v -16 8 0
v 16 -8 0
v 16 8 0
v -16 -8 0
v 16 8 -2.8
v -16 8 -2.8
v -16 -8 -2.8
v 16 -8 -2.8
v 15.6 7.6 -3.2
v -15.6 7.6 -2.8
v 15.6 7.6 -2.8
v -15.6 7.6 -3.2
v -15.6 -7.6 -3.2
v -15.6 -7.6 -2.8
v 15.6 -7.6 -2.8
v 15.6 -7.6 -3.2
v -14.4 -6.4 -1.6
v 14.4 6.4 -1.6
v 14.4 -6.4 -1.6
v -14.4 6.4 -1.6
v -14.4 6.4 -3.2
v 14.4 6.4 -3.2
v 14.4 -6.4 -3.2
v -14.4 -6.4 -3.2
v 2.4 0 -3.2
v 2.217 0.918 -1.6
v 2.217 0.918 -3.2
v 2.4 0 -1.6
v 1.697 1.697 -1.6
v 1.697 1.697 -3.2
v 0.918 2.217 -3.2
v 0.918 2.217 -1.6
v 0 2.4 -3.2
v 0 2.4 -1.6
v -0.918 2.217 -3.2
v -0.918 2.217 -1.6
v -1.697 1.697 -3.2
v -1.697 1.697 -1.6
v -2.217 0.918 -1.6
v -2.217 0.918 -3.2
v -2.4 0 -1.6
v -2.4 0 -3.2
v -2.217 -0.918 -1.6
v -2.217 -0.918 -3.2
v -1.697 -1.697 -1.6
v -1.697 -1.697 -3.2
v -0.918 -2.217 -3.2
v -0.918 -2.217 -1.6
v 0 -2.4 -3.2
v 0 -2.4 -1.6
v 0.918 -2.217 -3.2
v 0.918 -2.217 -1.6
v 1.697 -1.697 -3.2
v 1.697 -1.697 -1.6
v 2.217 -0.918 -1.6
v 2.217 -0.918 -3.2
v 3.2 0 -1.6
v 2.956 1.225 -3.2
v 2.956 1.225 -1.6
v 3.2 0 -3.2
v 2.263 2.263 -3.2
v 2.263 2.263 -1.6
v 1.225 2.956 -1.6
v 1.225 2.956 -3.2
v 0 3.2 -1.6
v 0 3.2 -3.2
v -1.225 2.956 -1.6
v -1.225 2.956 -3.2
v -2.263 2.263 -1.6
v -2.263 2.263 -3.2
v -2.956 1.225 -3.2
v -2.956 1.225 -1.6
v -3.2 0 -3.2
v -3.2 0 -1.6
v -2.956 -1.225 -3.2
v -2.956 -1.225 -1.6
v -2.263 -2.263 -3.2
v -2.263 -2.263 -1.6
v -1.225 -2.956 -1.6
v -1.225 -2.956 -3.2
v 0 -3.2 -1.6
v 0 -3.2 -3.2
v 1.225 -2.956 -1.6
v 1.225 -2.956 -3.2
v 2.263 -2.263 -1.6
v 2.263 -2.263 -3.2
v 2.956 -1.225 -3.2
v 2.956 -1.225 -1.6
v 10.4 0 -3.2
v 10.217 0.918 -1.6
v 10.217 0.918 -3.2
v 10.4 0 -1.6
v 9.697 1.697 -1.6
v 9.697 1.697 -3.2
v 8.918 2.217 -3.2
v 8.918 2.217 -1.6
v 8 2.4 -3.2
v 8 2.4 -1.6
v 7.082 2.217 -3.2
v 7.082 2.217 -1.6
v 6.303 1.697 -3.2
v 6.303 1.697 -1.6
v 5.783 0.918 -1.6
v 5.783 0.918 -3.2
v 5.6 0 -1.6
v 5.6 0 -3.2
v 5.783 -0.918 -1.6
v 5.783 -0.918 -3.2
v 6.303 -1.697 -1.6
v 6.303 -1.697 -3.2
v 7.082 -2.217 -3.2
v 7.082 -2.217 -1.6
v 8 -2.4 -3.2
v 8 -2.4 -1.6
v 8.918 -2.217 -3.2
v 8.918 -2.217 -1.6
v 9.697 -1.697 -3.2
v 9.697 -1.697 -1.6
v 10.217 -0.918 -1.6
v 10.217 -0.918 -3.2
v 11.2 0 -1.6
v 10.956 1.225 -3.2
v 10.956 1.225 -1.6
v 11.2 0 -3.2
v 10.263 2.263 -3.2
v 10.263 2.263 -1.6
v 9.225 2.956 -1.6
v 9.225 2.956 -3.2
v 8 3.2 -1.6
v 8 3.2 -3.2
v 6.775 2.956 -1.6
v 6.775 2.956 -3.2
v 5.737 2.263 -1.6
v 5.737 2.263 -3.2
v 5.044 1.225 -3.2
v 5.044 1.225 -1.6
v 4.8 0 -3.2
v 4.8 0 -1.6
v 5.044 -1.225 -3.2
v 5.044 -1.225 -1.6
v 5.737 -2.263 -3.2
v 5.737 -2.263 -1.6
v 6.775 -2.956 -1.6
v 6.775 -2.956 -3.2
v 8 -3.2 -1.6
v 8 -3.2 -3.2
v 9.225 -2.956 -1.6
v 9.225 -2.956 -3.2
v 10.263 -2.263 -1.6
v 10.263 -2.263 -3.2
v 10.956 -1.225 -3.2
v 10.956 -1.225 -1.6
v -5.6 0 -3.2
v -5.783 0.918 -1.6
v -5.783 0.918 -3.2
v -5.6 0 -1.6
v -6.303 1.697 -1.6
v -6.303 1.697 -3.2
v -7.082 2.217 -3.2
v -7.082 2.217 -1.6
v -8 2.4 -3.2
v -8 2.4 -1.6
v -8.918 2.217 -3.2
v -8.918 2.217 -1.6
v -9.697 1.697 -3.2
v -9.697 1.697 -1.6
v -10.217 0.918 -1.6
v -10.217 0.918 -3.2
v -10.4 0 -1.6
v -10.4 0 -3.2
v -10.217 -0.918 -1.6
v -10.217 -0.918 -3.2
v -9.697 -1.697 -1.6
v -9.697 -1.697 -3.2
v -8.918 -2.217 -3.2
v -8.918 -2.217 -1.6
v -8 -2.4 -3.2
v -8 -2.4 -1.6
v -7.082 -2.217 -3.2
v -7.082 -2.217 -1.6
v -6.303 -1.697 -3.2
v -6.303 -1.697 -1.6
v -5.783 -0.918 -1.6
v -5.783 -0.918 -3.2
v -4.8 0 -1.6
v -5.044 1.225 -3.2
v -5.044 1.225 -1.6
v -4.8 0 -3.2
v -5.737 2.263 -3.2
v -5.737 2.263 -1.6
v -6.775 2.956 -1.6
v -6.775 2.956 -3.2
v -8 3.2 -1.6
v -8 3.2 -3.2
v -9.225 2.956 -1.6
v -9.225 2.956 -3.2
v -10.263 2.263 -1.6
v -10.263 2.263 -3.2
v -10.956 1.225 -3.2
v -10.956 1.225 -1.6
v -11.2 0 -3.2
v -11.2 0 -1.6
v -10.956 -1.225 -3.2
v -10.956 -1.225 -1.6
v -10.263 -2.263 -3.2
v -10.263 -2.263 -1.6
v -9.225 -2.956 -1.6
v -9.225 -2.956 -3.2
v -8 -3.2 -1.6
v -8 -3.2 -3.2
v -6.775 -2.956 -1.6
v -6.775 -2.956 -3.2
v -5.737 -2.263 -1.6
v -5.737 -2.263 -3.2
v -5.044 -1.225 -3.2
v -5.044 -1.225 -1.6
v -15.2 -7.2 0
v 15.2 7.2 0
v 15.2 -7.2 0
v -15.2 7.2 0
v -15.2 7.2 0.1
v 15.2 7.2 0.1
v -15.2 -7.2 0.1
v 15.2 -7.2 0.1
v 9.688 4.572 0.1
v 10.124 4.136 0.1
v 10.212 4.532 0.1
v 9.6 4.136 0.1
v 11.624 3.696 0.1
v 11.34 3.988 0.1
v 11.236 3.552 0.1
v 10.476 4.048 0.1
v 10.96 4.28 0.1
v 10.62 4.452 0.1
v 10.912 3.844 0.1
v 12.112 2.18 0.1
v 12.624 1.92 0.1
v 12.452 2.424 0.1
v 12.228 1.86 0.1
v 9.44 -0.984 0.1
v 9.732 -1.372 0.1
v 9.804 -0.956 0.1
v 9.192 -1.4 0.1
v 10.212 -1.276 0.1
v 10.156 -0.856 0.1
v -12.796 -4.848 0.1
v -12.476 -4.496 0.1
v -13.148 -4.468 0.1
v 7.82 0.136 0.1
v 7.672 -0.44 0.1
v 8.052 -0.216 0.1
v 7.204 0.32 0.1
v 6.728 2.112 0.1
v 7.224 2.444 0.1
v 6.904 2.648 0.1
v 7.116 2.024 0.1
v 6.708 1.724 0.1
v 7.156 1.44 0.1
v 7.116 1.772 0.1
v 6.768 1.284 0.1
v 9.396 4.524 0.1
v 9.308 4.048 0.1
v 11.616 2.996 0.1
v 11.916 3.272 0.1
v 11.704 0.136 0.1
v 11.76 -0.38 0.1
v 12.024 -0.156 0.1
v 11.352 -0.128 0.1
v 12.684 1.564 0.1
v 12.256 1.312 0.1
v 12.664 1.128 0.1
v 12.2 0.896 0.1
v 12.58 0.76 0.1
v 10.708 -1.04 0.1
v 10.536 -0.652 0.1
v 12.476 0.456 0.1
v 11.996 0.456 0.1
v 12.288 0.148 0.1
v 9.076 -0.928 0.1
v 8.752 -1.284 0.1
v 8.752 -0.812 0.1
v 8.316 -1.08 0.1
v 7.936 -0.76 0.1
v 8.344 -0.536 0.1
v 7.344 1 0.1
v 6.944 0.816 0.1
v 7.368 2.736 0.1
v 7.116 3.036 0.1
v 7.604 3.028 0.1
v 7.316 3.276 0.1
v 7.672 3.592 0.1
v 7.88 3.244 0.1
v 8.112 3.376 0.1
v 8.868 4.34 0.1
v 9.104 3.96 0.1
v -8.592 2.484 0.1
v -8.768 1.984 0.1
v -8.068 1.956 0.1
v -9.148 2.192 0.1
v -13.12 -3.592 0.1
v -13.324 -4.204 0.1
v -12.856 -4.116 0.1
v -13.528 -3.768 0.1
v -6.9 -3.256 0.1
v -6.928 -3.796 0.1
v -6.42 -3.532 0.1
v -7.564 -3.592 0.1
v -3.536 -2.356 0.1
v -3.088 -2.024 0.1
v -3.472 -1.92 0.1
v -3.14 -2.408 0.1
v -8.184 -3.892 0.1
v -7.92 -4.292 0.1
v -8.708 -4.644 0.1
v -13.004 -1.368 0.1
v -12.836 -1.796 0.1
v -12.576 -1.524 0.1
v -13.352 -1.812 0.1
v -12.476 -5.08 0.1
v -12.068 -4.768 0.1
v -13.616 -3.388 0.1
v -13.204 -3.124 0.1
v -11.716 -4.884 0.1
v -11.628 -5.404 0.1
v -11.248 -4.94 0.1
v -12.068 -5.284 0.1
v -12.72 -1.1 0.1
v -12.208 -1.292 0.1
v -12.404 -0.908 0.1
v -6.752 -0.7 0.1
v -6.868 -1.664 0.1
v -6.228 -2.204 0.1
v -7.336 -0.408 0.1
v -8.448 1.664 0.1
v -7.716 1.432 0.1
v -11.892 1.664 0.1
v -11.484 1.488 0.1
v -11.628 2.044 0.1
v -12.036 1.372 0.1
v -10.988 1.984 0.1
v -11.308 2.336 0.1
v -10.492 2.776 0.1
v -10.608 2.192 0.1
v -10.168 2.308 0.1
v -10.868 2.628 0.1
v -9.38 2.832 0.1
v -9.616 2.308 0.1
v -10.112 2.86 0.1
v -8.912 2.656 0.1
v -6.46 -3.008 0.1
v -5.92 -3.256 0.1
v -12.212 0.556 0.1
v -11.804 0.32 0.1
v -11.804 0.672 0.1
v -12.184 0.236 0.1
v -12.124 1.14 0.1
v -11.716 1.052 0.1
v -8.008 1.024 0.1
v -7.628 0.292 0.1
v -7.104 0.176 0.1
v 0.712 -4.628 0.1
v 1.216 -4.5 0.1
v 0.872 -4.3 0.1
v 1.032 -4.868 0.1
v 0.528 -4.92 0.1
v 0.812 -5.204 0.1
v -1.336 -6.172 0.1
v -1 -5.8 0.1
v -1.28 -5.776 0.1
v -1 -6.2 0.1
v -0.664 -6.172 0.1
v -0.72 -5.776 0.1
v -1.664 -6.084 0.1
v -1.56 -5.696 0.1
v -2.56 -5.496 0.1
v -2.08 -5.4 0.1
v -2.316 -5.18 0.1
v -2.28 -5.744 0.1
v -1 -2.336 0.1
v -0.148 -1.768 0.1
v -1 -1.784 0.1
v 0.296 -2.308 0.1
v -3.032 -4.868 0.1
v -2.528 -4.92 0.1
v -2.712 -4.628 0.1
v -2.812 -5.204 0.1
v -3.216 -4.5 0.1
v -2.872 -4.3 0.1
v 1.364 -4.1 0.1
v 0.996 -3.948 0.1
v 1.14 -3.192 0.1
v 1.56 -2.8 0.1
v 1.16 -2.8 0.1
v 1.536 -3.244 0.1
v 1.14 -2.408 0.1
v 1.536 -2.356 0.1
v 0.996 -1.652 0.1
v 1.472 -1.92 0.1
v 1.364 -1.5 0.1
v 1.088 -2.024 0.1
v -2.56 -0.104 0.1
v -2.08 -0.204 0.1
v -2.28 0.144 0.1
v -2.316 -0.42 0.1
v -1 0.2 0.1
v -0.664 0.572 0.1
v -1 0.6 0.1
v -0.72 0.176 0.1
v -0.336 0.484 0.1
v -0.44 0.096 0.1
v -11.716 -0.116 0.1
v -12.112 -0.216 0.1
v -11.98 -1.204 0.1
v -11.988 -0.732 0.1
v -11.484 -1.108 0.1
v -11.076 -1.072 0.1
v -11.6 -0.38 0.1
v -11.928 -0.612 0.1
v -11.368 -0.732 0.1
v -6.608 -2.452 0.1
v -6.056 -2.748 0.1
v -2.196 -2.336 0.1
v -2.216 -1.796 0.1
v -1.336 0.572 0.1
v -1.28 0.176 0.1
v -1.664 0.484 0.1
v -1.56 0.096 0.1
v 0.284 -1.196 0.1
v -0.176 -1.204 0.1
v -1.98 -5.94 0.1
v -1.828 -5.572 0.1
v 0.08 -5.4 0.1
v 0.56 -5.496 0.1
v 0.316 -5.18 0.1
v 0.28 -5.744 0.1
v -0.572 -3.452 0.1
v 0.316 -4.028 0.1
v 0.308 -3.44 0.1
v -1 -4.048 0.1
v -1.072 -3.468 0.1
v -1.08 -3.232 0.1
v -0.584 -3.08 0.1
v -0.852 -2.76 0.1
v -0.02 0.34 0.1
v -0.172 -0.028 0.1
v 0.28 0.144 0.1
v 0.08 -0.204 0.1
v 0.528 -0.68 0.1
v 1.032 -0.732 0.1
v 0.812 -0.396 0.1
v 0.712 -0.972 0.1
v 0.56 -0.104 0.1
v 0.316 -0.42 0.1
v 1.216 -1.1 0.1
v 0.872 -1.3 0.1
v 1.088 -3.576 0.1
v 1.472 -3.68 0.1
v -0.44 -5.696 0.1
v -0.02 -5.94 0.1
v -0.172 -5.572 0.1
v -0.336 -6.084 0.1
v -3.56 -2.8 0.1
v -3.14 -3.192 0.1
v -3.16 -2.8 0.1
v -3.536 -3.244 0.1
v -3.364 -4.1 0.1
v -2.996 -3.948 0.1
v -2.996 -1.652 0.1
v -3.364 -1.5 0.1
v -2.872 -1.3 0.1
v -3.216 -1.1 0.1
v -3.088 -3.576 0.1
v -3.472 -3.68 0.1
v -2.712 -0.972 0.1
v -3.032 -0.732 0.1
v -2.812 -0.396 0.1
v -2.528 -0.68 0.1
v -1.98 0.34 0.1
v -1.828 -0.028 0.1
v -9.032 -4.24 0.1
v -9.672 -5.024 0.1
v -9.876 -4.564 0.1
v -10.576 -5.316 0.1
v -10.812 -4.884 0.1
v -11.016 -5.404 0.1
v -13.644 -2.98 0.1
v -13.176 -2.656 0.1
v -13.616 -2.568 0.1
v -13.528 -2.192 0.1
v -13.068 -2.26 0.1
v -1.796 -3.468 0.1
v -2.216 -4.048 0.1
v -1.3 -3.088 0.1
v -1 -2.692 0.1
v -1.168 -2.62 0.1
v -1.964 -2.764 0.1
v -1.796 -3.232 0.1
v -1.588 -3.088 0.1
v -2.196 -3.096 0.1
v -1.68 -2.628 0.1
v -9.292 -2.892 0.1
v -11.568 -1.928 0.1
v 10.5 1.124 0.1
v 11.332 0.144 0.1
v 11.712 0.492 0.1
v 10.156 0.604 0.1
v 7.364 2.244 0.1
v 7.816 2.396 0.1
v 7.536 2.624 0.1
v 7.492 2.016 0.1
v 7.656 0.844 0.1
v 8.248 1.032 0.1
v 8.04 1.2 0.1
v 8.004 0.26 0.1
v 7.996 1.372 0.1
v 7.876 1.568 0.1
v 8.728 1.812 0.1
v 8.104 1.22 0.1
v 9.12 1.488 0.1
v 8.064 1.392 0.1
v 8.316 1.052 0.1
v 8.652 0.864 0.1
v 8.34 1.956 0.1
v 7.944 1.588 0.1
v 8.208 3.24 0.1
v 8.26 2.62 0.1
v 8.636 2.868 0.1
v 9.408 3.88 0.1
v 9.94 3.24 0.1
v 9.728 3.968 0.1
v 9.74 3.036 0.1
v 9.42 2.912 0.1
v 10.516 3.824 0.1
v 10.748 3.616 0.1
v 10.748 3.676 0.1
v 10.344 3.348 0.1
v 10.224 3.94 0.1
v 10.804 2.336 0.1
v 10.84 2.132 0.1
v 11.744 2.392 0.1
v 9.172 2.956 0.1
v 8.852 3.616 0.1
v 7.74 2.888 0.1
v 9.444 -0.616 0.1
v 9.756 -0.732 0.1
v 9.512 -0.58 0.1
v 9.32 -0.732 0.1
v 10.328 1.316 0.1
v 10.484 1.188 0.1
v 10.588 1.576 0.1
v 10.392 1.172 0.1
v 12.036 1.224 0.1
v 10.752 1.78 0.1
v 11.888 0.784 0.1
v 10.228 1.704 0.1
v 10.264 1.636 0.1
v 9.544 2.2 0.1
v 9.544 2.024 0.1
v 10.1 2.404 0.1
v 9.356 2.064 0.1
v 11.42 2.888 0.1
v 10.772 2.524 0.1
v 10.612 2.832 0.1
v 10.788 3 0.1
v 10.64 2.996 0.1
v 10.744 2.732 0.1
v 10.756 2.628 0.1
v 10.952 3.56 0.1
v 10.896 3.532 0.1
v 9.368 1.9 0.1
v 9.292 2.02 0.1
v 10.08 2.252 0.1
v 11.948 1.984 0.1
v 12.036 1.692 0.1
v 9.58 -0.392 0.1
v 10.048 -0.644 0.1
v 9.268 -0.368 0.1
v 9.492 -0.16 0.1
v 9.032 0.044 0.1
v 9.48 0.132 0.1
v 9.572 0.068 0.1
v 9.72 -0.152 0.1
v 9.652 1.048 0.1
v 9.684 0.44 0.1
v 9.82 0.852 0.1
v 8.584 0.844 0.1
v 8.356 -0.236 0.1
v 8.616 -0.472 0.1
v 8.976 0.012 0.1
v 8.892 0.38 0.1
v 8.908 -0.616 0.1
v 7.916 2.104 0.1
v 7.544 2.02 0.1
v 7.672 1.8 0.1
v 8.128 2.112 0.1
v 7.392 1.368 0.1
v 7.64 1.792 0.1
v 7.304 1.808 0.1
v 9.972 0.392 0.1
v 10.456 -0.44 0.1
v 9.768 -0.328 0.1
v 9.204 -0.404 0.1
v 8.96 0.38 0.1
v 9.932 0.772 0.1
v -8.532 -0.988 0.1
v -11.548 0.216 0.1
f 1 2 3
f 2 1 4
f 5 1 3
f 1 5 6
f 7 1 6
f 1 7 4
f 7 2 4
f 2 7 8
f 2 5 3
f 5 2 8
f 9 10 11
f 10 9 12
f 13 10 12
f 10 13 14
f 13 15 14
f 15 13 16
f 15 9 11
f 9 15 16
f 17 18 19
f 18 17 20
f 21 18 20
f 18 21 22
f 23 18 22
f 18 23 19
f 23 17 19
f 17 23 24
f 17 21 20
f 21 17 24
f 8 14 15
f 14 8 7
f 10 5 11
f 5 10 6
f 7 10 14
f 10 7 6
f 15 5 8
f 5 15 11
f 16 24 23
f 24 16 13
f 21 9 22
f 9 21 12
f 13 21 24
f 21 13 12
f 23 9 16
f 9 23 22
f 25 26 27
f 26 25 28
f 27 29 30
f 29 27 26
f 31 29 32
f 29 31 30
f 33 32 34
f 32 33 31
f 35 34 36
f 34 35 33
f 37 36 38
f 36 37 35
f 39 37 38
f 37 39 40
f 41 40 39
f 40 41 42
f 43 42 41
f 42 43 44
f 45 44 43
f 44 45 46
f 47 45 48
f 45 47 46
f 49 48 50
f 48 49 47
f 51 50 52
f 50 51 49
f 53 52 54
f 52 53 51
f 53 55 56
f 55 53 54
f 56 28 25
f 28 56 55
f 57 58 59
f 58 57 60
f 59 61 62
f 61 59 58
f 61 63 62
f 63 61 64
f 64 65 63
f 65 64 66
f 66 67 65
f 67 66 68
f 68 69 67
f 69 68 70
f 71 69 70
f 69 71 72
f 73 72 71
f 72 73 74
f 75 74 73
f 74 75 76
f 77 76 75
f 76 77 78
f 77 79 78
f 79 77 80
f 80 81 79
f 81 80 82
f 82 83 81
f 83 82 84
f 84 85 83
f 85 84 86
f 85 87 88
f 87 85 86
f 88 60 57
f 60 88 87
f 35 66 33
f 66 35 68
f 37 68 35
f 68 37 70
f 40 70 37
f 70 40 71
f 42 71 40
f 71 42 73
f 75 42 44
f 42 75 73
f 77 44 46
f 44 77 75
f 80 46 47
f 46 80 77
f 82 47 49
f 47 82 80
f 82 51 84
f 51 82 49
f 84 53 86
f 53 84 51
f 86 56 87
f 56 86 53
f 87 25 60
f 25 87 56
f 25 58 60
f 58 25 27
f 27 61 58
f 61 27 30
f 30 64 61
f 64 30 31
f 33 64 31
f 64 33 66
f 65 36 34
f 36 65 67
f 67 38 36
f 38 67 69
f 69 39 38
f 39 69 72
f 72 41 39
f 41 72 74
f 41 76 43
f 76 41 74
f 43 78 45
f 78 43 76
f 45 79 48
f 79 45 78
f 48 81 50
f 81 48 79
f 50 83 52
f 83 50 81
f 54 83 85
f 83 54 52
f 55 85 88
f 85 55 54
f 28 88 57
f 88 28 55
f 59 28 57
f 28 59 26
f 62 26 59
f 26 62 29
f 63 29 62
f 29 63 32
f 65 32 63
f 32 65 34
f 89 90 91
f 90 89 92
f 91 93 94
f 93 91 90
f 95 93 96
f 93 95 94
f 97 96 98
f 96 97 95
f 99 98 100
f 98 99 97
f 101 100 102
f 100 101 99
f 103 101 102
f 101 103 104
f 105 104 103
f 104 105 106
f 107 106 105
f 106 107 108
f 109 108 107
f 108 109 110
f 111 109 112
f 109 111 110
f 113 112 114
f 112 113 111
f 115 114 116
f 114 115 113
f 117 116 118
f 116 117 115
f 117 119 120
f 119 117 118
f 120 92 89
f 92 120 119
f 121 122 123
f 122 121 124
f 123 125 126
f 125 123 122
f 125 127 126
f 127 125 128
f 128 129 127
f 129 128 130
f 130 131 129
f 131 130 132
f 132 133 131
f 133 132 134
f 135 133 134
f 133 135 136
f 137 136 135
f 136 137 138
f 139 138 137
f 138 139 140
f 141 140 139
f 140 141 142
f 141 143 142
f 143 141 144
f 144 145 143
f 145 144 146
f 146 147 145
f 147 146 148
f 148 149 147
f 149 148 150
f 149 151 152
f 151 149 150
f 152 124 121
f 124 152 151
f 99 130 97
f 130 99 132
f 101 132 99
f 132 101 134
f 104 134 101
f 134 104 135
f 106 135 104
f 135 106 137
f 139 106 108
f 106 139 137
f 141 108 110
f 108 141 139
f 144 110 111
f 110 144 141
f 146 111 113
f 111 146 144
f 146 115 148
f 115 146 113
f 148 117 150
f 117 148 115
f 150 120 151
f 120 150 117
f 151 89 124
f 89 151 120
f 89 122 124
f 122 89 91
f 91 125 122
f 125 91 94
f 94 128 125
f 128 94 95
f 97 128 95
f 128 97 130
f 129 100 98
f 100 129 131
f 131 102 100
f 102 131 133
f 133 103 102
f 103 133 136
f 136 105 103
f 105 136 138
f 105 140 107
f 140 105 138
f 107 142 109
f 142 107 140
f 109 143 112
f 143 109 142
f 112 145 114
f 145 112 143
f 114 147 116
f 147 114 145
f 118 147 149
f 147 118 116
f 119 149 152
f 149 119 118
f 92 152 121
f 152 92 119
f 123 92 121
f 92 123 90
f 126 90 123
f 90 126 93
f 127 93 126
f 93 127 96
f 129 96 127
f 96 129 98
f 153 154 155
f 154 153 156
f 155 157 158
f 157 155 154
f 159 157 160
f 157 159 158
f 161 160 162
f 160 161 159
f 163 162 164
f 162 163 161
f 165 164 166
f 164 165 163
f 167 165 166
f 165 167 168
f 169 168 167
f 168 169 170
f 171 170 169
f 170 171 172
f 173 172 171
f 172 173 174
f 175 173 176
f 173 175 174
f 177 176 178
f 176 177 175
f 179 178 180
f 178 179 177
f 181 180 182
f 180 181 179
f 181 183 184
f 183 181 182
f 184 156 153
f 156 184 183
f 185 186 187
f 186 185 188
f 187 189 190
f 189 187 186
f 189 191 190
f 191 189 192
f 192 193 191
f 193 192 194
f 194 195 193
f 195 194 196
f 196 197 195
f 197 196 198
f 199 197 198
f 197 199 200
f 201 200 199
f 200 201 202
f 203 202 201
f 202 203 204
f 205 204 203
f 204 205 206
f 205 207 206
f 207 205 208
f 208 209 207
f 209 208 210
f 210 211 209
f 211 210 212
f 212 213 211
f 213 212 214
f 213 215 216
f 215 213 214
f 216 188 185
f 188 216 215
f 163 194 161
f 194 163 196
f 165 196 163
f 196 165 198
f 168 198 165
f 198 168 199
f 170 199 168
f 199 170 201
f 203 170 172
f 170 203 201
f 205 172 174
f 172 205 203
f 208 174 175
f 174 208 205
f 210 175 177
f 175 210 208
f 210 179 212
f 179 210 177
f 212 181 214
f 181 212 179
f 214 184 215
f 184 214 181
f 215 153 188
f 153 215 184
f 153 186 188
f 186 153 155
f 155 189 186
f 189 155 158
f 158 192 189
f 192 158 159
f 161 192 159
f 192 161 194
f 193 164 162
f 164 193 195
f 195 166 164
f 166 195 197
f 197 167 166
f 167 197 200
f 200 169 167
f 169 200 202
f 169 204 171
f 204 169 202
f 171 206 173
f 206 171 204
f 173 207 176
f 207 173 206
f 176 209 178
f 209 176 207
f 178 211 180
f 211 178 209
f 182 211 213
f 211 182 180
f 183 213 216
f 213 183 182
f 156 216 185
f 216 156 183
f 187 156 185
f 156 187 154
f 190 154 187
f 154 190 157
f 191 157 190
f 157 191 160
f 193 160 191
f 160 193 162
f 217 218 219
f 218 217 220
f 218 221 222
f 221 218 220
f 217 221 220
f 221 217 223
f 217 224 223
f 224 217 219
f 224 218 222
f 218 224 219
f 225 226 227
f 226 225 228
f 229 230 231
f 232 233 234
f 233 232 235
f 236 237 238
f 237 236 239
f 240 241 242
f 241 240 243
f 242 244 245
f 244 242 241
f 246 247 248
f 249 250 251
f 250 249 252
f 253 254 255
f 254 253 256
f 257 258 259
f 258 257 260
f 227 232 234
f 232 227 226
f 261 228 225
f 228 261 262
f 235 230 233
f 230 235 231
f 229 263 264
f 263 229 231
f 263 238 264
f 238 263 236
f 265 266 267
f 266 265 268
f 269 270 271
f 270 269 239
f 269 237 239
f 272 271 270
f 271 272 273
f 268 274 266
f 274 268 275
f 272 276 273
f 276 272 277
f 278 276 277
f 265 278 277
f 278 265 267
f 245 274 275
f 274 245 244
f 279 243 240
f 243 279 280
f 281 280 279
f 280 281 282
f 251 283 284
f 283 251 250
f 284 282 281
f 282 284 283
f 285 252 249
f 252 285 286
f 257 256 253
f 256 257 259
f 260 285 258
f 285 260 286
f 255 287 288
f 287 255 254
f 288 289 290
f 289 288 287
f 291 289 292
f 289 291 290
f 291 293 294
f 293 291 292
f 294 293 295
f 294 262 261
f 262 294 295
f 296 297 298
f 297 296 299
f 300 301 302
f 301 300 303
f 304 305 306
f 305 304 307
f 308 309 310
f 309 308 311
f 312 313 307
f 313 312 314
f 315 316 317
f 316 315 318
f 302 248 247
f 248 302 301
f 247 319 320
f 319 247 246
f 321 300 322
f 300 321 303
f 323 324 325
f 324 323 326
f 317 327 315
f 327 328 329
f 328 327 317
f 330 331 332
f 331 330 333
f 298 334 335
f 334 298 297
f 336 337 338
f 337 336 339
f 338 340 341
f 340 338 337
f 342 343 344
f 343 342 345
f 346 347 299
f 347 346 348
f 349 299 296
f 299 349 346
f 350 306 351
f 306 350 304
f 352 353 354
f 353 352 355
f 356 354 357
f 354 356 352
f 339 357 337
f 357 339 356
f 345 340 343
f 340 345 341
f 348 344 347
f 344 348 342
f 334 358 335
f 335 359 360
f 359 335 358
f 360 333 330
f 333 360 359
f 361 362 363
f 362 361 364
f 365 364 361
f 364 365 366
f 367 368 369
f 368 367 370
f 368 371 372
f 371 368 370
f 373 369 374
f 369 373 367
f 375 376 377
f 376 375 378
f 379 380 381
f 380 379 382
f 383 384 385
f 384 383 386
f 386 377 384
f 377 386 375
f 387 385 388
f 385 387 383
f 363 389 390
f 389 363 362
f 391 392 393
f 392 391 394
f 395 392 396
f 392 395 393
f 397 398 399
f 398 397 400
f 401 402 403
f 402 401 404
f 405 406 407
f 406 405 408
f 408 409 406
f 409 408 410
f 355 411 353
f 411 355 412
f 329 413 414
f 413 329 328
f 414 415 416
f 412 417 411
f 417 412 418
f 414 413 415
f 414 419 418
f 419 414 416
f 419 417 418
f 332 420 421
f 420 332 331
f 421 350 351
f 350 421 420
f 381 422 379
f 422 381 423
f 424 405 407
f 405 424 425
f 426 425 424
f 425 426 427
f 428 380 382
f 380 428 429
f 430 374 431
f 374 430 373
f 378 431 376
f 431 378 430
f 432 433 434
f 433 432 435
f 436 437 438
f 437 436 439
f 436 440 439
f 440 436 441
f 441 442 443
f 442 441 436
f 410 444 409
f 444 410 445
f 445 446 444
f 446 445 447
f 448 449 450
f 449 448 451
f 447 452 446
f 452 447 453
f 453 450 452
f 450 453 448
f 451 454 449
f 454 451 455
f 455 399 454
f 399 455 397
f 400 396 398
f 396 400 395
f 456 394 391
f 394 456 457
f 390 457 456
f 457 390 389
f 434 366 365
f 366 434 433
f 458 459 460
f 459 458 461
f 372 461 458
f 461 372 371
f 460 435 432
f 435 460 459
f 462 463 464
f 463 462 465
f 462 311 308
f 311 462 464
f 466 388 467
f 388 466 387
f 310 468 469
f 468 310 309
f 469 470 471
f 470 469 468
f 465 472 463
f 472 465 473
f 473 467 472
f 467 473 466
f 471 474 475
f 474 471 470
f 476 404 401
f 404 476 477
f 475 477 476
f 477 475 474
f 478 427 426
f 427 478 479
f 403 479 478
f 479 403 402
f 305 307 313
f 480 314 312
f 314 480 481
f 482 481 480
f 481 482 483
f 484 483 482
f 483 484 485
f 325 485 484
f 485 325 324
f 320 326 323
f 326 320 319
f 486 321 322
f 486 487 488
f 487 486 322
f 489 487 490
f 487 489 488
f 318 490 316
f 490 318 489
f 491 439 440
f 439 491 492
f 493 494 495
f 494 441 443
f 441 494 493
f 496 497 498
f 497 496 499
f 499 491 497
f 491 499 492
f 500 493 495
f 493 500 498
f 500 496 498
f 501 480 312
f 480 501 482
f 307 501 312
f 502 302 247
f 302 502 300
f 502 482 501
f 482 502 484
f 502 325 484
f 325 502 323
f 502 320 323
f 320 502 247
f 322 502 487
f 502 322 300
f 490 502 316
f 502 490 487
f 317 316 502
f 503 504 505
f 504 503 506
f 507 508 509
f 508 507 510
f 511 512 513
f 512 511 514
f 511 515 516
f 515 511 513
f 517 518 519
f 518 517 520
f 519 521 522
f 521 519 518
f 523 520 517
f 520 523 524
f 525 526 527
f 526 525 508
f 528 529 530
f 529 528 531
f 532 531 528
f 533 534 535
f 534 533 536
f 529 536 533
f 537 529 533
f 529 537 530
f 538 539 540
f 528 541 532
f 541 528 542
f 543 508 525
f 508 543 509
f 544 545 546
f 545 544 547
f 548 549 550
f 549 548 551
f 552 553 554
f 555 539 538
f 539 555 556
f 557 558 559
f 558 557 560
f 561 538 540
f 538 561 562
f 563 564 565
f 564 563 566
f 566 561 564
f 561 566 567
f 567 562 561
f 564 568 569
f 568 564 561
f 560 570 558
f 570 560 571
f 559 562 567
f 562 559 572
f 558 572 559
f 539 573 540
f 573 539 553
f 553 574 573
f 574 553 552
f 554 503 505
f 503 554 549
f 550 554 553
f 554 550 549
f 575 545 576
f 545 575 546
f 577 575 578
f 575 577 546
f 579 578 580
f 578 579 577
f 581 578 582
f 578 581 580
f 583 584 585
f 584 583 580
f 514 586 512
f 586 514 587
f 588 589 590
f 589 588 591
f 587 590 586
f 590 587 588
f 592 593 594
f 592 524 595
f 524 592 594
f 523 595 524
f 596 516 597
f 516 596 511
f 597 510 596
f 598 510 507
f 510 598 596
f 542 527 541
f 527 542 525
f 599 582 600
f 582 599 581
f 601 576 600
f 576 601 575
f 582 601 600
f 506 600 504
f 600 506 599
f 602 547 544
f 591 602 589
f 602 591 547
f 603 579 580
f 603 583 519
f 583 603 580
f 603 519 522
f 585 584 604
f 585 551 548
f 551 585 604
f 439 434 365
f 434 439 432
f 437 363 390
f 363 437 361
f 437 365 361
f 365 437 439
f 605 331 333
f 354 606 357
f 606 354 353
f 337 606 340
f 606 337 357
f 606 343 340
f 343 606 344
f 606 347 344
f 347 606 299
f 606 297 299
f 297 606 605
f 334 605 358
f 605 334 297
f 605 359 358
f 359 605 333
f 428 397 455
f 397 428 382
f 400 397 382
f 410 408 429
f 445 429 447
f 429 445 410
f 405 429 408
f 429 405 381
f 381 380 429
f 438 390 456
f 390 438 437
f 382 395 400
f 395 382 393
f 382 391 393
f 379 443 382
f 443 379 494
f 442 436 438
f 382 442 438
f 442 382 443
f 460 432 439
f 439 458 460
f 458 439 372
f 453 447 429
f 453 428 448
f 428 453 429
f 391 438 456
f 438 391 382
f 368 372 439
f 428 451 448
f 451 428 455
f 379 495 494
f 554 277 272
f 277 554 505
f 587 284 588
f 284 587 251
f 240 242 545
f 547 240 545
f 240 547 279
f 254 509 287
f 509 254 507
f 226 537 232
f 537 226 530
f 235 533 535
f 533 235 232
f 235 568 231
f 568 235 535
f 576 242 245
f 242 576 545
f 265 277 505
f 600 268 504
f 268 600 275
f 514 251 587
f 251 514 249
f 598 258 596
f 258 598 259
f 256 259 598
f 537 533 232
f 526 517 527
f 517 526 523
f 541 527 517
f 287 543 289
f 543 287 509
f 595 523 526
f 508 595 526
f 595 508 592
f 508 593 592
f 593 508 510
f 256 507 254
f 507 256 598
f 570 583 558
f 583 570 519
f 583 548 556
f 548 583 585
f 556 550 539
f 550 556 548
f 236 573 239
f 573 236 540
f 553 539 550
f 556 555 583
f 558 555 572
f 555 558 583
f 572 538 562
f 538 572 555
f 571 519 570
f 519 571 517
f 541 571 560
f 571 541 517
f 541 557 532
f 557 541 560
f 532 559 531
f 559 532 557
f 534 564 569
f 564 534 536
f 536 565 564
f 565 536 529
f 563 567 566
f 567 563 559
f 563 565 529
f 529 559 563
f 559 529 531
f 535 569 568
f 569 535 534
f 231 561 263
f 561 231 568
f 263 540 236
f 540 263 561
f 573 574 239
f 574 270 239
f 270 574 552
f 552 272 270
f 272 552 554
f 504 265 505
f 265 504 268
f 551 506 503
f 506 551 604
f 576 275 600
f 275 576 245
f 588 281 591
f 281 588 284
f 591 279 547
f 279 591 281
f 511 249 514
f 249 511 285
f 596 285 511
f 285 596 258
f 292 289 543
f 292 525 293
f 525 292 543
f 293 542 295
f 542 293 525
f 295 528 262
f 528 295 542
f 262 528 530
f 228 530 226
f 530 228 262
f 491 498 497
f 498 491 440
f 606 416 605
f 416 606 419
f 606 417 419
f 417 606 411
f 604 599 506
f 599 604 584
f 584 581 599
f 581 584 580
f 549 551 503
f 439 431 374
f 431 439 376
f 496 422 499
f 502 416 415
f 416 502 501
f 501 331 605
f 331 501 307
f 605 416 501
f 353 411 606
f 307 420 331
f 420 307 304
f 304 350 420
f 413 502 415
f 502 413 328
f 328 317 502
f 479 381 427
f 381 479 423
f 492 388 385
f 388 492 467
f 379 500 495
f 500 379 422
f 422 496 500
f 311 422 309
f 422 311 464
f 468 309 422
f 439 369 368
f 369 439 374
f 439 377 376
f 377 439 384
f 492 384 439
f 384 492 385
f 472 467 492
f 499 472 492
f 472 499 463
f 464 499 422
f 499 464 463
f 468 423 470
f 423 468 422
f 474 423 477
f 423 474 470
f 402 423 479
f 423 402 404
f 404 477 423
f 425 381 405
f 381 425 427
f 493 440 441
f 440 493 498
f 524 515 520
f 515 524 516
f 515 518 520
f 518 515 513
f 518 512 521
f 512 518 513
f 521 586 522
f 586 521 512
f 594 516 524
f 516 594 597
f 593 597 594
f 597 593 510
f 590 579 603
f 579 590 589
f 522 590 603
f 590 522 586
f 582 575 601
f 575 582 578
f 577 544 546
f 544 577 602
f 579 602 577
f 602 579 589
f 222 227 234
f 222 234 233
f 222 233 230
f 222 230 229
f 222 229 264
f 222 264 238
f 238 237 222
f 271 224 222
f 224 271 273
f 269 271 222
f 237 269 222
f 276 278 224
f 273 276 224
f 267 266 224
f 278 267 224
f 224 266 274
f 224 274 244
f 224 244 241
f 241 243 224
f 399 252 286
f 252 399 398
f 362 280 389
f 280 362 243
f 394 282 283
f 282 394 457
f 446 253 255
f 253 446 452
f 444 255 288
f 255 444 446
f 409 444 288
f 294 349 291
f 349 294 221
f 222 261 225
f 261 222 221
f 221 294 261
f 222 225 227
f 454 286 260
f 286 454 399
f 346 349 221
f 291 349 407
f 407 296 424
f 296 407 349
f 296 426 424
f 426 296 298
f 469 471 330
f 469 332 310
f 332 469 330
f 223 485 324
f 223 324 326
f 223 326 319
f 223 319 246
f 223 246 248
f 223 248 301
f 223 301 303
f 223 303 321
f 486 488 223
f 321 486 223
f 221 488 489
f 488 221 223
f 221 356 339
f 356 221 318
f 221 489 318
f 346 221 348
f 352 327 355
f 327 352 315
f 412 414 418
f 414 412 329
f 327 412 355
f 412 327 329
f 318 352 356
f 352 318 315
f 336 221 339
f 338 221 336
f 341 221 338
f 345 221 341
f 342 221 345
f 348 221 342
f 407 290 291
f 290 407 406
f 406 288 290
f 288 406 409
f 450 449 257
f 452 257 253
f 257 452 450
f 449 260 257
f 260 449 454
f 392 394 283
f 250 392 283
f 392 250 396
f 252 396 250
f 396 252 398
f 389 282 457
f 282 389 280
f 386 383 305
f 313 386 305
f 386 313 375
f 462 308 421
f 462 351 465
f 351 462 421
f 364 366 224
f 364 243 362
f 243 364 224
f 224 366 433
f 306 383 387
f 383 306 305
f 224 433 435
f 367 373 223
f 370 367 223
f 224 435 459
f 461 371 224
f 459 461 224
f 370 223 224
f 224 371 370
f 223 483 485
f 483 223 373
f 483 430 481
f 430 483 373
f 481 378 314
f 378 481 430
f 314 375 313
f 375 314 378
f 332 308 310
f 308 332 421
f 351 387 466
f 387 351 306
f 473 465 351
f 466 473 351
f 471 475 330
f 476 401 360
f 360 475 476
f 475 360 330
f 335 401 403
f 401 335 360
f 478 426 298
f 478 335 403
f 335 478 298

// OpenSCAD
use <../lib.scad>
use <6296256b.scad>
use <87079.scad>
function ldraw_lib__87079d18() = [
// 0 Tile  2 x  4 with Italy, Poland and Matterhorn Stickers on Medium Nougat Background Sticker
// 0 Name: 87079d18.dat
// 0 Author: Evert-Jan Boer [ejboer]
// 0 !LDRAW_ORG Shortcut UPDATE 2026-07
// 0 !LICENSE Licensed under CC BY 4.0 : see CAreadme.txt
// 
// 0 BFC CERTIFY CCW
  [0,"BFC","CERTIFY"],
  [0,"BFC","CCW"],
// 
// 0 !CATEGORY Sticker Shortcut
// 0 !KEYWORDS Bricklink 87079pb0903, Fiat 500, set 10271, set 77942
// 
// 0 !HISTORY 2026-07-30 [OrionP] Official Update 2026-07
// 
// 1 16 0 0 0 1 0 0 0 1 0 0 0 1 87079.dat
  [1,16,0,0,0,1,0,0,0,1,0,0,0,1, ldraw_lib__87079()],
// 1 16 0 0 0 1 0 0 0 1 0 0 0 1 6296256b.dat
  [1,16,0,0,0,1,0,0,0,1,0,0,0,1, ldraw_lib__6296256b()],
];
module ldraw_lib__87079d18(step=0, col=false, unit=2/5, alt=false, line=0.2, solid=!$preview)
    makepoly(ldraw_lib__87079d18(), step=step, col=col, unit=unit, alt=alt, line=line, solid=solid);
ldraw_lib__87079d18(line=0.2);
